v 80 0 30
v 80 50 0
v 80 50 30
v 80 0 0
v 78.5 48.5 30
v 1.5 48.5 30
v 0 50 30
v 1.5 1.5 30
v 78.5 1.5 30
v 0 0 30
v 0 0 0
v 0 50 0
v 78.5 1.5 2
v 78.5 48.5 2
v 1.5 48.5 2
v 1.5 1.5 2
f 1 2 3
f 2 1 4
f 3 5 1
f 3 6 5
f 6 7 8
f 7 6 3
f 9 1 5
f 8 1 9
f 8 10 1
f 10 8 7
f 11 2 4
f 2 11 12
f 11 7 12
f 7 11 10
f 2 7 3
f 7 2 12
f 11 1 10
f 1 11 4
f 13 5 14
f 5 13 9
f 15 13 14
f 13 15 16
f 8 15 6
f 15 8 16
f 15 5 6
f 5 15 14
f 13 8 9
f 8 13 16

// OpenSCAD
$fn = 32;

// ----------------------------------------------------------------------
// Open box: 1.5 mm walls
// ----------------------------------------------------------------------

// --- parameters (mm) ---
box_l = 80;               // outer length, X
box_w = 50;               // outer width, Y
box_h = 30;               // outer height, Z
wall = 1.5;               // wall thickness
floor = 2;                // floor thickness

difference() {
  cube([box_l, box_w, box_h]);
  translate([wall, wall, floor])
    cube([box_l - 2 * wall, box_w - 2 * wall, box_h]);
}
